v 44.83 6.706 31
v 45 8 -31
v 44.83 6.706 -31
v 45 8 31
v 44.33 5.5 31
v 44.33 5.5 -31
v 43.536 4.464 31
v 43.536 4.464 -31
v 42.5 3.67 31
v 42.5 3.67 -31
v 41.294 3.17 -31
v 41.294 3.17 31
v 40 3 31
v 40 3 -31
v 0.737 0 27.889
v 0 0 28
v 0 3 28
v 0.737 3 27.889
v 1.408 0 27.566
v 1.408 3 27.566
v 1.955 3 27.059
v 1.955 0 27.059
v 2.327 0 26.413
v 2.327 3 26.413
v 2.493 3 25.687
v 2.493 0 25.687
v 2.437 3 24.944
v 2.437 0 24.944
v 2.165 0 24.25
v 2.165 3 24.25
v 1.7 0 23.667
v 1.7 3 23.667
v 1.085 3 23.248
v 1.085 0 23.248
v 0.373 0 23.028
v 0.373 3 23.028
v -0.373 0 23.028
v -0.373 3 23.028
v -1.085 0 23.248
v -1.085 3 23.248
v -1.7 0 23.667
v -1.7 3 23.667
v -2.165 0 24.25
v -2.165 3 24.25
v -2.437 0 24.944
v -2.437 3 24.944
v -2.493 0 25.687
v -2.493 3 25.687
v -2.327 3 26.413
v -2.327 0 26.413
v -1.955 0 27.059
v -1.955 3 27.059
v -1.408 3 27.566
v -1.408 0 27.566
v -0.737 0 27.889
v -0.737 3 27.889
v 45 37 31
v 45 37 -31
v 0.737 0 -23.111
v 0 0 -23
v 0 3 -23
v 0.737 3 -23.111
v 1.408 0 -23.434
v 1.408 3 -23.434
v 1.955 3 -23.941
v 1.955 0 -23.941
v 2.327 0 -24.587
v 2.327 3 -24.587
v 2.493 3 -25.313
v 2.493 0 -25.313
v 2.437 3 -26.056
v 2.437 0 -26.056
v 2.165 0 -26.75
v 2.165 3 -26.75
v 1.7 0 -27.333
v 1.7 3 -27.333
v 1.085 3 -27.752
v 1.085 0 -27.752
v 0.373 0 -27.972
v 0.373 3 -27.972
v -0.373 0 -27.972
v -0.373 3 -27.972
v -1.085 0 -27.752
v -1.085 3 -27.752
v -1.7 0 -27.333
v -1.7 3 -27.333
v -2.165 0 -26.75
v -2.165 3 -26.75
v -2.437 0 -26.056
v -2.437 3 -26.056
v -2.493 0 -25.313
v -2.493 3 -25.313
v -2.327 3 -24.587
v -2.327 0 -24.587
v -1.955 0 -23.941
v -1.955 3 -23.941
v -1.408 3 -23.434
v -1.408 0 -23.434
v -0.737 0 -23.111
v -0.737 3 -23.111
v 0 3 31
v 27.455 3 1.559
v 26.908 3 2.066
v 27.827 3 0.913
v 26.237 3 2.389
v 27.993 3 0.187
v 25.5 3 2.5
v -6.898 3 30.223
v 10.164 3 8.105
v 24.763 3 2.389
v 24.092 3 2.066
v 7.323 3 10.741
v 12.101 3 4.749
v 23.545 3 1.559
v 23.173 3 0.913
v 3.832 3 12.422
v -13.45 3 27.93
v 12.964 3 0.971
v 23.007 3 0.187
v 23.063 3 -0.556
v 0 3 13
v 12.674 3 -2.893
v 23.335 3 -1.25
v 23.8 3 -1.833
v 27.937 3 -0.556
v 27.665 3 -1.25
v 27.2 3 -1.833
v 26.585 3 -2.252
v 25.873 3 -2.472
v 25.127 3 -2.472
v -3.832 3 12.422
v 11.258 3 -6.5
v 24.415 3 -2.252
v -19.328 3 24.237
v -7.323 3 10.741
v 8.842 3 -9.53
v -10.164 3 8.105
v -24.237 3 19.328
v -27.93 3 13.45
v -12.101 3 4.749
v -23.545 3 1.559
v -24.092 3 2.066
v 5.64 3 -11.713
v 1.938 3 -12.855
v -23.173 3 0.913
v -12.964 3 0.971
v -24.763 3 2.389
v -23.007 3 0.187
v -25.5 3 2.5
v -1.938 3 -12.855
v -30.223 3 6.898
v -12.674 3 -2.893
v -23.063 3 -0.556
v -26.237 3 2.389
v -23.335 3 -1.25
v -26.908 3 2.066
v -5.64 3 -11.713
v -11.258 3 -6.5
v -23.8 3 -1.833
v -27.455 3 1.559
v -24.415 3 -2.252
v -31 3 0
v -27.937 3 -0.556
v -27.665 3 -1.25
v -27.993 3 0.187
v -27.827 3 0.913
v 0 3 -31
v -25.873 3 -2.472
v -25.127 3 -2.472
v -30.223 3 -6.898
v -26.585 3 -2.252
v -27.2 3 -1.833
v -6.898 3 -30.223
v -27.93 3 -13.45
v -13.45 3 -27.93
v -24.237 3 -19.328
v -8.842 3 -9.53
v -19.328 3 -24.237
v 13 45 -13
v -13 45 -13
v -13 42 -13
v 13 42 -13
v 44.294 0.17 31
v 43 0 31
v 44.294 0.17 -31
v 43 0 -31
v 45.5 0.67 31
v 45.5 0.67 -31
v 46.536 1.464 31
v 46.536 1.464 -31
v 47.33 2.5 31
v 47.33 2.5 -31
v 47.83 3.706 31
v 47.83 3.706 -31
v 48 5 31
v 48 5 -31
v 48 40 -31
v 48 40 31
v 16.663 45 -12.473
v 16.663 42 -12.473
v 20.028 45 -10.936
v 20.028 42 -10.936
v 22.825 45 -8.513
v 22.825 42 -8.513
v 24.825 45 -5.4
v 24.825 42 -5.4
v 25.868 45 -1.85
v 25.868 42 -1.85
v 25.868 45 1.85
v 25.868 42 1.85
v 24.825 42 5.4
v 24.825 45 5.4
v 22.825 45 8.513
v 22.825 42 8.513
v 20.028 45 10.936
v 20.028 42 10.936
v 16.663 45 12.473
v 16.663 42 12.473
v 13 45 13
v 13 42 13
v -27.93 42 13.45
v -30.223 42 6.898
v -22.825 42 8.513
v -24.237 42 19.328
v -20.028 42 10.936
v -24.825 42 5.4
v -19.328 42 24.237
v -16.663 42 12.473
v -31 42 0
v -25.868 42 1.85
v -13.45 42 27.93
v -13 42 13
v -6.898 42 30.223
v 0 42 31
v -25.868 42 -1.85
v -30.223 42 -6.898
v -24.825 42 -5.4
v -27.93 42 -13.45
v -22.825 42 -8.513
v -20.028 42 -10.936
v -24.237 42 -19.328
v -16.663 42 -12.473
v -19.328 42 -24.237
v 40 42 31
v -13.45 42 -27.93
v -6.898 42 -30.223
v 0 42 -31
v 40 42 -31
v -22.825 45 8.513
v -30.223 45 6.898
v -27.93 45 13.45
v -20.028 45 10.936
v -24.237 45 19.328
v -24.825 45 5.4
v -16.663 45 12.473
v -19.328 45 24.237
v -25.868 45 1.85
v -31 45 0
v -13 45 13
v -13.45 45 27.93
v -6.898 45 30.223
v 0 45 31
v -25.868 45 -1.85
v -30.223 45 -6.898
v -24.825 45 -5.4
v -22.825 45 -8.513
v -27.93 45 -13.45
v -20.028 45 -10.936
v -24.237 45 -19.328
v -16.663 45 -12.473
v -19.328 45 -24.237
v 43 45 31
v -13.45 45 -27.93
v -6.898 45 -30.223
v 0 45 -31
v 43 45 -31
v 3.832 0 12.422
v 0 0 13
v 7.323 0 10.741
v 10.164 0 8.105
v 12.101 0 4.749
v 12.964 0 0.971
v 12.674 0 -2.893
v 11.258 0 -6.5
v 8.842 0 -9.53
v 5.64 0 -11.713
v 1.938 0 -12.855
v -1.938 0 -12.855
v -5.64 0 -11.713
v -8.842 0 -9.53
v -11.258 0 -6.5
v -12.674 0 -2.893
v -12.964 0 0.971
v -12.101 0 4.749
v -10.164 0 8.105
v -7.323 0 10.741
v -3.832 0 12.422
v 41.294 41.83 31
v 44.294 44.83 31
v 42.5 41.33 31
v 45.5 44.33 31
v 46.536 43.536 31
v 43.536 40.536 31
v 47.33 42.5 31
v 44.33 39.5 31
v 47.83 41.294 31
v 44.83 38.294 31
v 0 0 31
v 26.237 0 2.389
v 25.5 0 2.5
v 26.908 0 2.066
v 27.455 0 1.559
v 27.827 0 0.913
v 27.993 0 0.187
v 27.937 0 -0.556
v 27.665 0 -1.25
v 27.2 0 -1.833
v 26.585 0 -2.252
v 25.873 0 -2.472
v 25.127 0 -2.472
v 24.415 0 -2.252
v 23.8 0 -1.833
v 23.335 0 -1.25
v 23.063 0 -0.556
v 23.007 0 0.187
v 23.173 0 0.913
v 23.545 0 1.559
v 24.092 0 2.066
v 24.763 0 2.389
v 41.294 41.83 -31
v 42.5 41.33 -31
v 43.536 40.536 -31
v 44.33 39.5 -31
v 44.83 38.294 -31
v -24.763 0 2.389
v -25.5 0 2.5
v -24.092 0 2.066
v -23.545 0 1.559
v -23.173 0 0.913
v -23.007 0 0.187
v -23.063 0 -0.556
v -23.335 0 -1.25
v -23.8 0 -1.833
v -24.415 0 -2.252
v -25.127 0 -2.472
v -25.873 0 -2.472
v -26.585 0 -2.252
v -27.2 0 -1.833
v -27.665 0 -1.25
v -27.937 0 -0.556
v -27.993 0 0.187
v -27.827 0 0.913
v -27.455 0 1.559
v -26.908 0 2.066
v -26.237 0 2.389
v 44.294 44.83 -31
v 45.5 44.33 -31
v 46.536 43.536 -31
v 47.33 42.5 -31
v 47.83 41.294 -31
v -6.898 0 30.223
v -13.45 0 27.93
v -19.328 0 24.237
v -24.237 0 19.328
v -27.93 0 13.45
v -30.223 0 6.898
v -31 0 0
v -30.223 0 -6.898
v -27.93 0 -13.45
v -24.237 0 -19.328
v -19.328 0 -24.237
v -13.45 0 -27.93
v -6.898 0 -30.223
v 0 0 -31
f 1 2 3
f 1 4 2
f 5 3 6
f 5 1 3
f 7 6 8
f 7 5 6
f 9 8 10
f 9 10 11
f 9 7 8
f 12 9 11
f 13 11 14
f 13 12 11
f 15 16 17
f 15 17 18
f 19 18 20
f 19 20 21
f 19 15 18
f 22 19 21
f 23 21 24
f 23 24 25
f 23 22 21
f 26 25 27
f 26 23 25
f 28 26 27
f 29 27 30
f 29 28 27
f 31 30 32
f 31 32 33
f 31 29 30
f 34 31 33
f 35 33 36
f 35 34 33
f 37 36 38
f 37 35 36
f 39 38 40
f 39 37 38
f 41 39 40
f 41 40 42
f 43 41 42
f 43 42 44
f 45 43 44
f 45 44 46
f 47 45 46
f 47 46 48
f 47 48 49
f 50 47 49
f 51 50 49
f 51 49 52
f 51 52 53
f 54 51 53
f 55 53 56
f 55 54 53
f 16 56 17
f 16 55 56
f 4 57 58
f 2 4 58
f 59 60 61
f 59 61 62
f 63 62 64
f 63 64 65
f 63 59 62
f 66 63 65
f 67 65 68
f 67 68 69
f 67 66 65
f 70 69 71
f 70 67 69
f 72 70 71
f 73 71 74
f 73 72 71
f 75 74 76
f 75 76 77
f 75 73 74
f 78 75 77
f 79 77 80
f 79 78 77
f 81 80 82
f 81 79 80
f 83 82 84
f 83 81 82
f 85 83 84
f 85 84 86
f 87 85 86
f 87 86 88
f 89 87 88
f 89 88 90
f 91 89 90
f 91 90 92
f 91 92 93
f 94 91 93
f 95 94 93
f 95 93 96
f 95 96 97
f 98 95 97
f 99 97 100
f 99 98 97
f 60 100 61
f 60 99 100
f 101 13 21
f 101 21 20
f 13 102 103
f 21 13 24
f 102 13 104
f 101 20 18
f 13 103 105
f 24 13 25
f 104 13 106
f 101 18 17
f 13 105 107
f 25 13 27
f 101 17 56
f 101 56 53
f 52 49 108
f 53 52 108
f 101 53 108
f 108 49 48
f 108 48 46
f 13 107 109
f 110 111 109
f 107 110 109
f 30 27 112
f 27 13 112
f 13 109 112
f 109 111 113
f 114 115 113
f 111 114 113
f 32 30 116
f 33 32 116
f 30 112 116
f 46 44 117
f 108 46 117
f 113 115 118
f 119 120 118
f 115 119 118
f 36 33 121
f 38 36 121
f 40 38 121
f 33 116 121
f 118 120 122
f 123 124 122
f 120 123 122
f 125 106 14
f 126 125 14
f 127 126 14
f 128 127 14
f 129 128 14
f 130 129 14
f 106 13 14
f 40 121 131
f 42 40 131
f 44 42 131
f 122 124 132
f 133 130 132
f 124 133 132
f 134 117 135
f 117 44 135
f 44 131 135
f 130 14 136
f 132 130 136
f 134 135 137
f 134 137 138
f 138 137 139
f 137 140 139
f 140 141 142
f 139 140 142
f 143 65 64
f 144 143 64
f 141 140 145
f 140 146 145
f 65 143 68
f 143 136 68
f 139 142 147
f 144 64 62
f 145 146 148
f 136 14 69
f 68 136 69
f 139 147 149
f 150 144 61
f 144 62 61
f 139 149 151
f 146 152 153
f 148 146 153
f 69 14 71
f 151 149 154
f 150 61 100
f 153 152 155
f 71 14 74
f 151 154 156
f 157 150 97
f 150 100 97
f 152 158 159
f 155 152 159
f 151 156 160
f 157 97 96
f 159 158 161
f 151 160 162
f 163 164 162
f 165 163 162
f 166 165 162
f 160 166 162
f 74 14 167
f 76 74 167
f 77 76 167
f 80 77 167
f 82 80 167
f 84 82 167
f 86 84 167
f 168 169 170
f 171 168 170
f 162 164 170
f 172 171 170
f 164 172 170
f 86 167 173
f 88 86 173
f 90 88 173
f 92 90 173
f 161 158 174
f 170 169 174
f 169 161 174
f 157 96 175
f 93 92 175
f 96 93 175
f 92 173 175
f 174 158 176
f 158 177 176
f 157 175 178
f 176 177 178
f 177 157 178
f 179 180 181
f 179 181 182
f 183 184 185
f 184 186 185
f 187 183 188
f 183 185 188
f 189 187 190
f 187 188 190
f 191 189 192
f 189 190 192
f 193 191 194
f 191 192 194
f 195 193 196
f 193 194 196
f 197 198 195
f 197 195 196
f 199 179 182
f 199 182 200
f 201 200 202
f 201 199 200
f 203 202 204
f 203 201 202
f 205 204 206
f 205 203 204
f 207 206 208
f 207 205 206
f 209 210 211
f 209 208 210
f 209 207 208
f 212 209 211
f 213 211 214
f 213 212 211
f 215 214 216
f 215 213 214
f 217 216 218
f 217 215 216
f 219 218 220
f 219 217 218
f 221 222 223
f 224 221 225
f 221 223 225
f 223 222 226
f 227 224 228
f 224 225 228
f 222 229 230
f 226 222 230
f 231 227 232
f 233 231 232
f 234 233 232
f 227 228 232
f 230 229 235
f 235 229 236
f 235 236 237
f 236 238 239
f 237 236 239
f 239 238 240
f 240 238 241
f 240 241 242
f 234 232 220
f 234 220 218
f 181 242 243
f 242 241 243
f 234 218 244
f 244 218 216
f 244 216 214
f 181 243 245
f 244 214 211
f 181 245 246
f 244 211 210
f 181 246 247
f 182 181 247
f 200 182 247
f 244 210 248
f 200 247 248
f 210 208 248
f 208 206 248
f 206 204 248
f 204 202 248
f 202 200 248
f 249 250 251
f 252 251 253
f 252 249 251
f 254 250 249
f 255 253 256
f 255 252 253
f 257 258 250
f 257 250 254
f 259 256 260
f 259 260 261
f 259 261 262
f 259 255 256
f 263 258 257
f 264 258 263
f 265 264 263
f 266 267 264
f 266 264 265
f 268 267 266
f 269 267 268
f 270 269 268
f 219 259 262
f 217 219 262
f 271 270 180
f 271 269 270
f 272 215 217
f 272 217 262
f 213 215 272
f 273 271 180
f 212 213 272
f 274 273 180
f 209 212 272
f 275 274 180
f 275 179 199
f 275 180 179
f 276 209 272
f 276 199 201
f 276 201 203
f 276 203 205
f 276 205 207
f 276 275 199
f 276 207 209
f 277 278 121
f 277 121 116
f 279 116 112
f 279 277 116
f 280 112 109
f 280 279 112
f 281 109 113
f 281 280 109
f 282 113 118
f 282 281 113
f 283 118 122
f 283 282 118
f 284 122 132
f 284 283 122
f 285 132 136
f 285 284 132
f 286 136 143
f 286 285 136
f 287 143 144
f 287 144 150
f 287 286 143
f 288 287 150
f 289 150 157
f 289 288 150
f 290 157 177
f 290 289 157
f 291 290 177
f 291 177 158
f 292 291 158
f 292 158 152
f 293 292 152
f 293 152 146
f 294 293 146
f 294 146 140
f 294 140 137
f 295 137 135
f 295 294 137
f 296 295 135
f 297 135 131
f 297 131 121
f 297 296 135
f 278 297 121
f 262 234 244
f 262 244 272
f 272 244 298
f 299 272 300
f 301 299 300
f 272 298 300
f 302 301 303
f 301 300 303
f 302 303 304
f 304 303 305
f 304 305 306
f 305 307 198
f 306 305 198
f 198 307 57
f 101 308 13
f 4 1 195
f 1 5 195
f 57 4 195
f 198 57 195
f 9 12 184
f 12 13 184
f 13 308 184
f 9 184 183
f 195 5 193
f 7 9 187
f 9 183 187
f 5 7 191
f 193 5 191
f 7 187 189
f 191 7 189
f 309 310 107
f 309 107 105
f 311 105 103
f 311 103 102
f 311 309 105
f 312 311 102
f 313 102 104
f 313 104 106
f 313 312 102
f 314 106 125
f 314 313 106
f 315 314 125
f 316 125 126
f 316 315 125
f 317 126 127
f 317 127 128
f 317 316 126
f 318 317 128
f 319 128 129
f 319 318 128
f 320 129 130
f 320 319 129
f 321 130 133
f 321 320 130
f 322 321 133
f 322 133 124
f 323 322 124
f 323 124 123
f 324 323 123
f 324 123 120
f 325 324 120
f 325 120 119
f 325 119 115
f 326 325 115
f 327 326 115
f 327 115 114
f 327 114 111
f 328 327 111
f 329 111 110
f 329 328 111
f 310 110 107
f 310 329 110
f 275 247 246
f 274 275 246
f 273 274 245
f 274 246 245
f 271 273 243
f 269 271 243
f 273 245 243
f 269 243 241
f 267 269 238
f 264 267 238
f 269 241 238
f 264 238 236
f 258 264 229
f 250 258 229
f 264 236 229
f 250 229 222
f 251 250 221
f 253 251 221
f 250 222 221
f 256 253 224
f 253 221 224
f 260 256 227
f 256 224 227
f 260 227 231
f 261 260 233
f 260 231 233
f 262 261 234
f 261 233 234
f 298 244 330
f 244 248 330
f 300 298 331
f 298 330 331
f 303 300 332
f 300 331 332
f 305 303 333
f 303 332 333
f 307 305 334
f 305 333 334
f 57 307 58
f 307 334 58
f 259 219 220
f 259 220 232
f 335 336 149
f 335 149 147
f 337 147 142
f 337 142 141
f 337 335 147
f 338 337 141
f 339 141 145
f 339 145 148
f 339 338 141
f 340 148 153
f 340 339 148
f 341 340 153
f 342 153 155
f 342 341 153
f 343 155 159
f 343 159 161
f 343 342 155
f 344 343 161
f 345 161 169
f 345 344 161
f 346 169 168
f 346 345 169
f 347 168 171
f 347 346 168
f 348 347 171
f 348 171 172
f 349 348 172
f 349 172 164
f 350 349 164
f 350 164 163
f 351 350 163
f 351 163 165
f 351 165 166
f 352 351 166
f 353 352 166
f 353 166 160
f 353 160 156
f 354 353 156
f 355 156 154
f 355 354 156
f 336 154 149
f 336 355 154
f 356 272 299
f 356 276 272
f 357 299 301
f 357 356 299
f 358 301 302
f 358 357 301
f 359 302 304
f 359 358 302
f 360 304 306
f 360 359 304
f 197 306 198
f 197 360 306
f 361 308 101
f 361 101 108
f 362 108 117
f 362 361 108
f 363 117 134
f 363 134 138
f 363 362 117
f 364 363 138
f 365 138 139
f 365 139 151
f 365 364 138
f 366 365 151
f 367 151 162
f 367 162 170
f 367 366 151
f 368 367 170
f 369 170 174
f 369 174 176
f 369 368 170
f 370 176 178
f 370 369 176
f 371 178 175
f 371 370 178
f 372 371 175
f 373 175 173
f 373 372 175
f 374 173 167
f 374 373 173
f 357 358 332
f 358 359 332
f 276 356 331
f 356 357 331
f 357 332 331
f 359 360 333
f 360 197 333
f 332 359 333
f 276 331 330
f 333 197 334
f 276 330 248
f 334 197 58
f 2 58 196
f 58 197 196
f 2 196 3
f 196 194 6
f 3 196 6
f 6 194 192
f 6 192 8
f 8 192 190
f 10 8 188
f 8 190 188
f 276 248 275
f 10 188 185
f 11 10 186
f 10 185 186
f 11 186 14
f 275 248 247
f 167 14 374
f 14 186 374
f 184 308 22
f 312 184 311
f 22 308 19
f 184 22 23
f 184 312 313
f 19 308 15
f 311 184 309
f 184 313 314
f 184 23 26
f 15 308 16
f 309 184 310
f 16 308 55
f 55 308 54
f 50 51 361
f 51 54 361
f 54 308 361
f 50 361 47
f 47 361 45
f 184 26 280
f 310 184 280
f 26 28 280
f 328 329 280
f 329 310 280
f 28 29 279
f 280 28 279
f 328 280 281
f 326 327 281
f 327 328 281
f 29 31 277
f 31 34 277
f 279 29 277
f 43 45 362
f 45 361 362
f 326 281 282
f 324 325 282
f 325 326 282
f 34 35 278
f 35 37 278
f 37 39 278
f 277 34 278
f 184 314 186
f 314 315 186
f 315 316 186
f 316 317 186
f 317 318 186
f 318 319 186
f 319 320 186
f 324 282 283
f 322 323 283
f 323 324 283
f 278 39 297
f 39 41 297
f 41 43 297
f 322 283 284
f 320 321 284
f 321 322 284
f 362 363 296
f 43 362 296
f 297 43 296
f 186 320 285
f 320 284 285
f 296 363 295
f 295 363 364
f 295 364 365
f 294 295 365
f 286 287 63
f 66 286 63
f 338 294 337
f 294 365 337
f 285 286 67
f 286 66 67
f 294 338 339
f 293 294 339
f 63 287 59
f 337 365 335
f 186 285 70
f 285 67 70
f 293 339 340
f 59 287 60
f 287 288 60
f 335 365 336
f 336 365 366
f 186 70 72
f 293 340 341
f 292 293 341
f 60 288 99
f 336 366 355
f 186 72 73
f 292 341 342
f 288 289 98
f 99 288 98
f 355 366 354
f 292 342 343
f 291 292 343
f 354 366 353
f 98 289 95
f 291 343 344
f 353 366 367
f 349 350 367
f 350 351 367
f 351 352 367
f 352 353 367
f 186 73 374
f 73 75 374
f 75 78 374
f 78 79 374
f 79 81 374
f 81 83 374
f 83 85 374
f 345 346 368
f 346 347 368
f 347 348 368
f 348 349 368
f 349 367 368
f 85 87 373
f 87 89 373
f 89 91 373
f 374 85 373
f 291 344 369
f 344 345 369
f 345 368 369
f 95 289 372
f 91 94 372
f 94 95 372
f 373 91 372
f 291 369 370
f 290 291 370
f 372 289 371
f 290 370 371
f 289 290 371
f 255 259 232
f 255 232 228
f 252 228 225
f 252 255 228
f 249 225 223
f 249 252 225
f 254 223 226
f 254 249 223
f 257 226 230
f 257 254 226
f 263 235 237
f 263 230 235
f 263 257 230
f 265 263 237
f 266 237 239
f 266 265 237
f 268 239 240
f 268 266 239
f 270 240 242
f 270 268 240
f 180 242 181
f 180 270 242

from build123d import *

# Parameters (mm, degrees)
SKETCH1_R           = 13
SKETCH1_R_2         = 2.5
BOSS_EXTRUDE1_DEPTH = 3
SKETCH2_W           = 62
SKETCH2_H           = 45
BOSS_EXTRUDE2_DEPTH = 3
BOSS_EXTRUDE3_START = 42
BOSS_EXTRUDE3_DEPTH = 3
CUT_EXTRUDE1_REACH  = 74.732
FILLET1_R           = 5


# Read off the part's stored shape, not the designer's step: Boss-Extrude3
with BuildPart() as part:
    # Sketch1 → Boss-Extrude1 (new body)
    with BuildSketch(Plane(origin=(0, 0, 0), x_dir=(1, 0, 0), z_dir=(0, 1, 0))):
        with BuildLine():
            Line((0, 31), (45, 31))
            Line((45, 31), (45, -31))
            Line((45, -31), (0, -31))
            ThreePointArc((0, -31), (-31, 0), (0, 31))
        make_face()
        with Locations(Location((0, 0, 0), (0, 0, 270))):
            Circle(SKETCH1_R, mode=Mode.SUBTRACT)
        with Locations(Location((0, 25.5, 0), (0, 0, 270))):
            Circle(SKETCH1_R_2, mode=Mode.SUBTRACT)
        with Locations(Location((-25.5, 0, 0), (0, 0, 270))):
            Circle(SKETCH1_R_2, mode=Mode.SUBTRACT)
        with Locations(Location((0, -25.5, 0), (0, 0, 270))):
            Circle(SKETCH1_R_2, mode=Mode.SUBTRACT)
        with Locations(Location((25.5, 0, 0), (0, 0, 270))):
            Circle(SKETCH1_R_2, mode=Mode.SUBTRACT)
    extrude(amount=BOSS_EXTRUDE1_DEPTH)

    # Sketch2 → Boss-Extrude2 (add)
    with BuildSketch(Plane(origin=(45, 0, 0), x_dir=(0, 0, -1), z_dir=(1, 0, 0))):
        with Locations((0, 22.5)):
            Rectangle(SKETCH2_W, SKETCH2_H)
    extrude(amount=BOSS_EXTRUDE2_DEPTH)

    # Boss-Extrude3 outline → Boss-Extrude3 (add)
    with BuildSketch(Plane(origin=(0, 0, 0), x_dir=(1, 0, 0), z_dir=(0, 1, 0)).offset(BOSS_EXTRUDE3_START)):
        with BuildLine():
            ThreePointArc((0, 31), (-31, 0), (0, -31))
            Line((0, -31), (45, -31))
            Line((45, -31), (45, 31))
            Line((45, 31), (0, 31))
        make_face()
    extrude(amount=BOSS_EXTRUDE3_DEPTH)

    # Sketch4 → Cut-Extrude1 (cut, up to next)
    with BuildSketch(Plane(origin=(0, 45, 0), x_dir=(1, 0, 0), z_dir=(0, 1, 0)), mode=Mode.PRIVATE) as cut_extrude1_sk1:
        with BuildLine():
            Line((13, -13), (-13, -13))
            ThreePointArc((-13, -13), (-26, 0), (-13, 13))
            Line((-13, 13), (13, 13))
            ThreePointArc((13, 13), (26, 0), (13, -13))
        make_face()
    cut_extrude1_tool1 = extrude(cut_extrude1_sk1.sketch, amount=-CUT_EXTRUDE1_REACH, mode=Mode.PRIVATE) & part.part
    add(cut_extrude1_tool1.solids().sort_by_distance((0, 45, 0))[0], mode=Mode.SUBTRACT)

    # Fillet1
    fillet1_edges = [part.edges().sort_by_distance(p)[0] for p in [
        (45, 3, 0),
        (48, 0, 0),
        (48, 45, 0),
        (45, 42, 0),
    ]]
    fillet(fillet1_edges, radius=FILLET1_R)


solid = part.part
